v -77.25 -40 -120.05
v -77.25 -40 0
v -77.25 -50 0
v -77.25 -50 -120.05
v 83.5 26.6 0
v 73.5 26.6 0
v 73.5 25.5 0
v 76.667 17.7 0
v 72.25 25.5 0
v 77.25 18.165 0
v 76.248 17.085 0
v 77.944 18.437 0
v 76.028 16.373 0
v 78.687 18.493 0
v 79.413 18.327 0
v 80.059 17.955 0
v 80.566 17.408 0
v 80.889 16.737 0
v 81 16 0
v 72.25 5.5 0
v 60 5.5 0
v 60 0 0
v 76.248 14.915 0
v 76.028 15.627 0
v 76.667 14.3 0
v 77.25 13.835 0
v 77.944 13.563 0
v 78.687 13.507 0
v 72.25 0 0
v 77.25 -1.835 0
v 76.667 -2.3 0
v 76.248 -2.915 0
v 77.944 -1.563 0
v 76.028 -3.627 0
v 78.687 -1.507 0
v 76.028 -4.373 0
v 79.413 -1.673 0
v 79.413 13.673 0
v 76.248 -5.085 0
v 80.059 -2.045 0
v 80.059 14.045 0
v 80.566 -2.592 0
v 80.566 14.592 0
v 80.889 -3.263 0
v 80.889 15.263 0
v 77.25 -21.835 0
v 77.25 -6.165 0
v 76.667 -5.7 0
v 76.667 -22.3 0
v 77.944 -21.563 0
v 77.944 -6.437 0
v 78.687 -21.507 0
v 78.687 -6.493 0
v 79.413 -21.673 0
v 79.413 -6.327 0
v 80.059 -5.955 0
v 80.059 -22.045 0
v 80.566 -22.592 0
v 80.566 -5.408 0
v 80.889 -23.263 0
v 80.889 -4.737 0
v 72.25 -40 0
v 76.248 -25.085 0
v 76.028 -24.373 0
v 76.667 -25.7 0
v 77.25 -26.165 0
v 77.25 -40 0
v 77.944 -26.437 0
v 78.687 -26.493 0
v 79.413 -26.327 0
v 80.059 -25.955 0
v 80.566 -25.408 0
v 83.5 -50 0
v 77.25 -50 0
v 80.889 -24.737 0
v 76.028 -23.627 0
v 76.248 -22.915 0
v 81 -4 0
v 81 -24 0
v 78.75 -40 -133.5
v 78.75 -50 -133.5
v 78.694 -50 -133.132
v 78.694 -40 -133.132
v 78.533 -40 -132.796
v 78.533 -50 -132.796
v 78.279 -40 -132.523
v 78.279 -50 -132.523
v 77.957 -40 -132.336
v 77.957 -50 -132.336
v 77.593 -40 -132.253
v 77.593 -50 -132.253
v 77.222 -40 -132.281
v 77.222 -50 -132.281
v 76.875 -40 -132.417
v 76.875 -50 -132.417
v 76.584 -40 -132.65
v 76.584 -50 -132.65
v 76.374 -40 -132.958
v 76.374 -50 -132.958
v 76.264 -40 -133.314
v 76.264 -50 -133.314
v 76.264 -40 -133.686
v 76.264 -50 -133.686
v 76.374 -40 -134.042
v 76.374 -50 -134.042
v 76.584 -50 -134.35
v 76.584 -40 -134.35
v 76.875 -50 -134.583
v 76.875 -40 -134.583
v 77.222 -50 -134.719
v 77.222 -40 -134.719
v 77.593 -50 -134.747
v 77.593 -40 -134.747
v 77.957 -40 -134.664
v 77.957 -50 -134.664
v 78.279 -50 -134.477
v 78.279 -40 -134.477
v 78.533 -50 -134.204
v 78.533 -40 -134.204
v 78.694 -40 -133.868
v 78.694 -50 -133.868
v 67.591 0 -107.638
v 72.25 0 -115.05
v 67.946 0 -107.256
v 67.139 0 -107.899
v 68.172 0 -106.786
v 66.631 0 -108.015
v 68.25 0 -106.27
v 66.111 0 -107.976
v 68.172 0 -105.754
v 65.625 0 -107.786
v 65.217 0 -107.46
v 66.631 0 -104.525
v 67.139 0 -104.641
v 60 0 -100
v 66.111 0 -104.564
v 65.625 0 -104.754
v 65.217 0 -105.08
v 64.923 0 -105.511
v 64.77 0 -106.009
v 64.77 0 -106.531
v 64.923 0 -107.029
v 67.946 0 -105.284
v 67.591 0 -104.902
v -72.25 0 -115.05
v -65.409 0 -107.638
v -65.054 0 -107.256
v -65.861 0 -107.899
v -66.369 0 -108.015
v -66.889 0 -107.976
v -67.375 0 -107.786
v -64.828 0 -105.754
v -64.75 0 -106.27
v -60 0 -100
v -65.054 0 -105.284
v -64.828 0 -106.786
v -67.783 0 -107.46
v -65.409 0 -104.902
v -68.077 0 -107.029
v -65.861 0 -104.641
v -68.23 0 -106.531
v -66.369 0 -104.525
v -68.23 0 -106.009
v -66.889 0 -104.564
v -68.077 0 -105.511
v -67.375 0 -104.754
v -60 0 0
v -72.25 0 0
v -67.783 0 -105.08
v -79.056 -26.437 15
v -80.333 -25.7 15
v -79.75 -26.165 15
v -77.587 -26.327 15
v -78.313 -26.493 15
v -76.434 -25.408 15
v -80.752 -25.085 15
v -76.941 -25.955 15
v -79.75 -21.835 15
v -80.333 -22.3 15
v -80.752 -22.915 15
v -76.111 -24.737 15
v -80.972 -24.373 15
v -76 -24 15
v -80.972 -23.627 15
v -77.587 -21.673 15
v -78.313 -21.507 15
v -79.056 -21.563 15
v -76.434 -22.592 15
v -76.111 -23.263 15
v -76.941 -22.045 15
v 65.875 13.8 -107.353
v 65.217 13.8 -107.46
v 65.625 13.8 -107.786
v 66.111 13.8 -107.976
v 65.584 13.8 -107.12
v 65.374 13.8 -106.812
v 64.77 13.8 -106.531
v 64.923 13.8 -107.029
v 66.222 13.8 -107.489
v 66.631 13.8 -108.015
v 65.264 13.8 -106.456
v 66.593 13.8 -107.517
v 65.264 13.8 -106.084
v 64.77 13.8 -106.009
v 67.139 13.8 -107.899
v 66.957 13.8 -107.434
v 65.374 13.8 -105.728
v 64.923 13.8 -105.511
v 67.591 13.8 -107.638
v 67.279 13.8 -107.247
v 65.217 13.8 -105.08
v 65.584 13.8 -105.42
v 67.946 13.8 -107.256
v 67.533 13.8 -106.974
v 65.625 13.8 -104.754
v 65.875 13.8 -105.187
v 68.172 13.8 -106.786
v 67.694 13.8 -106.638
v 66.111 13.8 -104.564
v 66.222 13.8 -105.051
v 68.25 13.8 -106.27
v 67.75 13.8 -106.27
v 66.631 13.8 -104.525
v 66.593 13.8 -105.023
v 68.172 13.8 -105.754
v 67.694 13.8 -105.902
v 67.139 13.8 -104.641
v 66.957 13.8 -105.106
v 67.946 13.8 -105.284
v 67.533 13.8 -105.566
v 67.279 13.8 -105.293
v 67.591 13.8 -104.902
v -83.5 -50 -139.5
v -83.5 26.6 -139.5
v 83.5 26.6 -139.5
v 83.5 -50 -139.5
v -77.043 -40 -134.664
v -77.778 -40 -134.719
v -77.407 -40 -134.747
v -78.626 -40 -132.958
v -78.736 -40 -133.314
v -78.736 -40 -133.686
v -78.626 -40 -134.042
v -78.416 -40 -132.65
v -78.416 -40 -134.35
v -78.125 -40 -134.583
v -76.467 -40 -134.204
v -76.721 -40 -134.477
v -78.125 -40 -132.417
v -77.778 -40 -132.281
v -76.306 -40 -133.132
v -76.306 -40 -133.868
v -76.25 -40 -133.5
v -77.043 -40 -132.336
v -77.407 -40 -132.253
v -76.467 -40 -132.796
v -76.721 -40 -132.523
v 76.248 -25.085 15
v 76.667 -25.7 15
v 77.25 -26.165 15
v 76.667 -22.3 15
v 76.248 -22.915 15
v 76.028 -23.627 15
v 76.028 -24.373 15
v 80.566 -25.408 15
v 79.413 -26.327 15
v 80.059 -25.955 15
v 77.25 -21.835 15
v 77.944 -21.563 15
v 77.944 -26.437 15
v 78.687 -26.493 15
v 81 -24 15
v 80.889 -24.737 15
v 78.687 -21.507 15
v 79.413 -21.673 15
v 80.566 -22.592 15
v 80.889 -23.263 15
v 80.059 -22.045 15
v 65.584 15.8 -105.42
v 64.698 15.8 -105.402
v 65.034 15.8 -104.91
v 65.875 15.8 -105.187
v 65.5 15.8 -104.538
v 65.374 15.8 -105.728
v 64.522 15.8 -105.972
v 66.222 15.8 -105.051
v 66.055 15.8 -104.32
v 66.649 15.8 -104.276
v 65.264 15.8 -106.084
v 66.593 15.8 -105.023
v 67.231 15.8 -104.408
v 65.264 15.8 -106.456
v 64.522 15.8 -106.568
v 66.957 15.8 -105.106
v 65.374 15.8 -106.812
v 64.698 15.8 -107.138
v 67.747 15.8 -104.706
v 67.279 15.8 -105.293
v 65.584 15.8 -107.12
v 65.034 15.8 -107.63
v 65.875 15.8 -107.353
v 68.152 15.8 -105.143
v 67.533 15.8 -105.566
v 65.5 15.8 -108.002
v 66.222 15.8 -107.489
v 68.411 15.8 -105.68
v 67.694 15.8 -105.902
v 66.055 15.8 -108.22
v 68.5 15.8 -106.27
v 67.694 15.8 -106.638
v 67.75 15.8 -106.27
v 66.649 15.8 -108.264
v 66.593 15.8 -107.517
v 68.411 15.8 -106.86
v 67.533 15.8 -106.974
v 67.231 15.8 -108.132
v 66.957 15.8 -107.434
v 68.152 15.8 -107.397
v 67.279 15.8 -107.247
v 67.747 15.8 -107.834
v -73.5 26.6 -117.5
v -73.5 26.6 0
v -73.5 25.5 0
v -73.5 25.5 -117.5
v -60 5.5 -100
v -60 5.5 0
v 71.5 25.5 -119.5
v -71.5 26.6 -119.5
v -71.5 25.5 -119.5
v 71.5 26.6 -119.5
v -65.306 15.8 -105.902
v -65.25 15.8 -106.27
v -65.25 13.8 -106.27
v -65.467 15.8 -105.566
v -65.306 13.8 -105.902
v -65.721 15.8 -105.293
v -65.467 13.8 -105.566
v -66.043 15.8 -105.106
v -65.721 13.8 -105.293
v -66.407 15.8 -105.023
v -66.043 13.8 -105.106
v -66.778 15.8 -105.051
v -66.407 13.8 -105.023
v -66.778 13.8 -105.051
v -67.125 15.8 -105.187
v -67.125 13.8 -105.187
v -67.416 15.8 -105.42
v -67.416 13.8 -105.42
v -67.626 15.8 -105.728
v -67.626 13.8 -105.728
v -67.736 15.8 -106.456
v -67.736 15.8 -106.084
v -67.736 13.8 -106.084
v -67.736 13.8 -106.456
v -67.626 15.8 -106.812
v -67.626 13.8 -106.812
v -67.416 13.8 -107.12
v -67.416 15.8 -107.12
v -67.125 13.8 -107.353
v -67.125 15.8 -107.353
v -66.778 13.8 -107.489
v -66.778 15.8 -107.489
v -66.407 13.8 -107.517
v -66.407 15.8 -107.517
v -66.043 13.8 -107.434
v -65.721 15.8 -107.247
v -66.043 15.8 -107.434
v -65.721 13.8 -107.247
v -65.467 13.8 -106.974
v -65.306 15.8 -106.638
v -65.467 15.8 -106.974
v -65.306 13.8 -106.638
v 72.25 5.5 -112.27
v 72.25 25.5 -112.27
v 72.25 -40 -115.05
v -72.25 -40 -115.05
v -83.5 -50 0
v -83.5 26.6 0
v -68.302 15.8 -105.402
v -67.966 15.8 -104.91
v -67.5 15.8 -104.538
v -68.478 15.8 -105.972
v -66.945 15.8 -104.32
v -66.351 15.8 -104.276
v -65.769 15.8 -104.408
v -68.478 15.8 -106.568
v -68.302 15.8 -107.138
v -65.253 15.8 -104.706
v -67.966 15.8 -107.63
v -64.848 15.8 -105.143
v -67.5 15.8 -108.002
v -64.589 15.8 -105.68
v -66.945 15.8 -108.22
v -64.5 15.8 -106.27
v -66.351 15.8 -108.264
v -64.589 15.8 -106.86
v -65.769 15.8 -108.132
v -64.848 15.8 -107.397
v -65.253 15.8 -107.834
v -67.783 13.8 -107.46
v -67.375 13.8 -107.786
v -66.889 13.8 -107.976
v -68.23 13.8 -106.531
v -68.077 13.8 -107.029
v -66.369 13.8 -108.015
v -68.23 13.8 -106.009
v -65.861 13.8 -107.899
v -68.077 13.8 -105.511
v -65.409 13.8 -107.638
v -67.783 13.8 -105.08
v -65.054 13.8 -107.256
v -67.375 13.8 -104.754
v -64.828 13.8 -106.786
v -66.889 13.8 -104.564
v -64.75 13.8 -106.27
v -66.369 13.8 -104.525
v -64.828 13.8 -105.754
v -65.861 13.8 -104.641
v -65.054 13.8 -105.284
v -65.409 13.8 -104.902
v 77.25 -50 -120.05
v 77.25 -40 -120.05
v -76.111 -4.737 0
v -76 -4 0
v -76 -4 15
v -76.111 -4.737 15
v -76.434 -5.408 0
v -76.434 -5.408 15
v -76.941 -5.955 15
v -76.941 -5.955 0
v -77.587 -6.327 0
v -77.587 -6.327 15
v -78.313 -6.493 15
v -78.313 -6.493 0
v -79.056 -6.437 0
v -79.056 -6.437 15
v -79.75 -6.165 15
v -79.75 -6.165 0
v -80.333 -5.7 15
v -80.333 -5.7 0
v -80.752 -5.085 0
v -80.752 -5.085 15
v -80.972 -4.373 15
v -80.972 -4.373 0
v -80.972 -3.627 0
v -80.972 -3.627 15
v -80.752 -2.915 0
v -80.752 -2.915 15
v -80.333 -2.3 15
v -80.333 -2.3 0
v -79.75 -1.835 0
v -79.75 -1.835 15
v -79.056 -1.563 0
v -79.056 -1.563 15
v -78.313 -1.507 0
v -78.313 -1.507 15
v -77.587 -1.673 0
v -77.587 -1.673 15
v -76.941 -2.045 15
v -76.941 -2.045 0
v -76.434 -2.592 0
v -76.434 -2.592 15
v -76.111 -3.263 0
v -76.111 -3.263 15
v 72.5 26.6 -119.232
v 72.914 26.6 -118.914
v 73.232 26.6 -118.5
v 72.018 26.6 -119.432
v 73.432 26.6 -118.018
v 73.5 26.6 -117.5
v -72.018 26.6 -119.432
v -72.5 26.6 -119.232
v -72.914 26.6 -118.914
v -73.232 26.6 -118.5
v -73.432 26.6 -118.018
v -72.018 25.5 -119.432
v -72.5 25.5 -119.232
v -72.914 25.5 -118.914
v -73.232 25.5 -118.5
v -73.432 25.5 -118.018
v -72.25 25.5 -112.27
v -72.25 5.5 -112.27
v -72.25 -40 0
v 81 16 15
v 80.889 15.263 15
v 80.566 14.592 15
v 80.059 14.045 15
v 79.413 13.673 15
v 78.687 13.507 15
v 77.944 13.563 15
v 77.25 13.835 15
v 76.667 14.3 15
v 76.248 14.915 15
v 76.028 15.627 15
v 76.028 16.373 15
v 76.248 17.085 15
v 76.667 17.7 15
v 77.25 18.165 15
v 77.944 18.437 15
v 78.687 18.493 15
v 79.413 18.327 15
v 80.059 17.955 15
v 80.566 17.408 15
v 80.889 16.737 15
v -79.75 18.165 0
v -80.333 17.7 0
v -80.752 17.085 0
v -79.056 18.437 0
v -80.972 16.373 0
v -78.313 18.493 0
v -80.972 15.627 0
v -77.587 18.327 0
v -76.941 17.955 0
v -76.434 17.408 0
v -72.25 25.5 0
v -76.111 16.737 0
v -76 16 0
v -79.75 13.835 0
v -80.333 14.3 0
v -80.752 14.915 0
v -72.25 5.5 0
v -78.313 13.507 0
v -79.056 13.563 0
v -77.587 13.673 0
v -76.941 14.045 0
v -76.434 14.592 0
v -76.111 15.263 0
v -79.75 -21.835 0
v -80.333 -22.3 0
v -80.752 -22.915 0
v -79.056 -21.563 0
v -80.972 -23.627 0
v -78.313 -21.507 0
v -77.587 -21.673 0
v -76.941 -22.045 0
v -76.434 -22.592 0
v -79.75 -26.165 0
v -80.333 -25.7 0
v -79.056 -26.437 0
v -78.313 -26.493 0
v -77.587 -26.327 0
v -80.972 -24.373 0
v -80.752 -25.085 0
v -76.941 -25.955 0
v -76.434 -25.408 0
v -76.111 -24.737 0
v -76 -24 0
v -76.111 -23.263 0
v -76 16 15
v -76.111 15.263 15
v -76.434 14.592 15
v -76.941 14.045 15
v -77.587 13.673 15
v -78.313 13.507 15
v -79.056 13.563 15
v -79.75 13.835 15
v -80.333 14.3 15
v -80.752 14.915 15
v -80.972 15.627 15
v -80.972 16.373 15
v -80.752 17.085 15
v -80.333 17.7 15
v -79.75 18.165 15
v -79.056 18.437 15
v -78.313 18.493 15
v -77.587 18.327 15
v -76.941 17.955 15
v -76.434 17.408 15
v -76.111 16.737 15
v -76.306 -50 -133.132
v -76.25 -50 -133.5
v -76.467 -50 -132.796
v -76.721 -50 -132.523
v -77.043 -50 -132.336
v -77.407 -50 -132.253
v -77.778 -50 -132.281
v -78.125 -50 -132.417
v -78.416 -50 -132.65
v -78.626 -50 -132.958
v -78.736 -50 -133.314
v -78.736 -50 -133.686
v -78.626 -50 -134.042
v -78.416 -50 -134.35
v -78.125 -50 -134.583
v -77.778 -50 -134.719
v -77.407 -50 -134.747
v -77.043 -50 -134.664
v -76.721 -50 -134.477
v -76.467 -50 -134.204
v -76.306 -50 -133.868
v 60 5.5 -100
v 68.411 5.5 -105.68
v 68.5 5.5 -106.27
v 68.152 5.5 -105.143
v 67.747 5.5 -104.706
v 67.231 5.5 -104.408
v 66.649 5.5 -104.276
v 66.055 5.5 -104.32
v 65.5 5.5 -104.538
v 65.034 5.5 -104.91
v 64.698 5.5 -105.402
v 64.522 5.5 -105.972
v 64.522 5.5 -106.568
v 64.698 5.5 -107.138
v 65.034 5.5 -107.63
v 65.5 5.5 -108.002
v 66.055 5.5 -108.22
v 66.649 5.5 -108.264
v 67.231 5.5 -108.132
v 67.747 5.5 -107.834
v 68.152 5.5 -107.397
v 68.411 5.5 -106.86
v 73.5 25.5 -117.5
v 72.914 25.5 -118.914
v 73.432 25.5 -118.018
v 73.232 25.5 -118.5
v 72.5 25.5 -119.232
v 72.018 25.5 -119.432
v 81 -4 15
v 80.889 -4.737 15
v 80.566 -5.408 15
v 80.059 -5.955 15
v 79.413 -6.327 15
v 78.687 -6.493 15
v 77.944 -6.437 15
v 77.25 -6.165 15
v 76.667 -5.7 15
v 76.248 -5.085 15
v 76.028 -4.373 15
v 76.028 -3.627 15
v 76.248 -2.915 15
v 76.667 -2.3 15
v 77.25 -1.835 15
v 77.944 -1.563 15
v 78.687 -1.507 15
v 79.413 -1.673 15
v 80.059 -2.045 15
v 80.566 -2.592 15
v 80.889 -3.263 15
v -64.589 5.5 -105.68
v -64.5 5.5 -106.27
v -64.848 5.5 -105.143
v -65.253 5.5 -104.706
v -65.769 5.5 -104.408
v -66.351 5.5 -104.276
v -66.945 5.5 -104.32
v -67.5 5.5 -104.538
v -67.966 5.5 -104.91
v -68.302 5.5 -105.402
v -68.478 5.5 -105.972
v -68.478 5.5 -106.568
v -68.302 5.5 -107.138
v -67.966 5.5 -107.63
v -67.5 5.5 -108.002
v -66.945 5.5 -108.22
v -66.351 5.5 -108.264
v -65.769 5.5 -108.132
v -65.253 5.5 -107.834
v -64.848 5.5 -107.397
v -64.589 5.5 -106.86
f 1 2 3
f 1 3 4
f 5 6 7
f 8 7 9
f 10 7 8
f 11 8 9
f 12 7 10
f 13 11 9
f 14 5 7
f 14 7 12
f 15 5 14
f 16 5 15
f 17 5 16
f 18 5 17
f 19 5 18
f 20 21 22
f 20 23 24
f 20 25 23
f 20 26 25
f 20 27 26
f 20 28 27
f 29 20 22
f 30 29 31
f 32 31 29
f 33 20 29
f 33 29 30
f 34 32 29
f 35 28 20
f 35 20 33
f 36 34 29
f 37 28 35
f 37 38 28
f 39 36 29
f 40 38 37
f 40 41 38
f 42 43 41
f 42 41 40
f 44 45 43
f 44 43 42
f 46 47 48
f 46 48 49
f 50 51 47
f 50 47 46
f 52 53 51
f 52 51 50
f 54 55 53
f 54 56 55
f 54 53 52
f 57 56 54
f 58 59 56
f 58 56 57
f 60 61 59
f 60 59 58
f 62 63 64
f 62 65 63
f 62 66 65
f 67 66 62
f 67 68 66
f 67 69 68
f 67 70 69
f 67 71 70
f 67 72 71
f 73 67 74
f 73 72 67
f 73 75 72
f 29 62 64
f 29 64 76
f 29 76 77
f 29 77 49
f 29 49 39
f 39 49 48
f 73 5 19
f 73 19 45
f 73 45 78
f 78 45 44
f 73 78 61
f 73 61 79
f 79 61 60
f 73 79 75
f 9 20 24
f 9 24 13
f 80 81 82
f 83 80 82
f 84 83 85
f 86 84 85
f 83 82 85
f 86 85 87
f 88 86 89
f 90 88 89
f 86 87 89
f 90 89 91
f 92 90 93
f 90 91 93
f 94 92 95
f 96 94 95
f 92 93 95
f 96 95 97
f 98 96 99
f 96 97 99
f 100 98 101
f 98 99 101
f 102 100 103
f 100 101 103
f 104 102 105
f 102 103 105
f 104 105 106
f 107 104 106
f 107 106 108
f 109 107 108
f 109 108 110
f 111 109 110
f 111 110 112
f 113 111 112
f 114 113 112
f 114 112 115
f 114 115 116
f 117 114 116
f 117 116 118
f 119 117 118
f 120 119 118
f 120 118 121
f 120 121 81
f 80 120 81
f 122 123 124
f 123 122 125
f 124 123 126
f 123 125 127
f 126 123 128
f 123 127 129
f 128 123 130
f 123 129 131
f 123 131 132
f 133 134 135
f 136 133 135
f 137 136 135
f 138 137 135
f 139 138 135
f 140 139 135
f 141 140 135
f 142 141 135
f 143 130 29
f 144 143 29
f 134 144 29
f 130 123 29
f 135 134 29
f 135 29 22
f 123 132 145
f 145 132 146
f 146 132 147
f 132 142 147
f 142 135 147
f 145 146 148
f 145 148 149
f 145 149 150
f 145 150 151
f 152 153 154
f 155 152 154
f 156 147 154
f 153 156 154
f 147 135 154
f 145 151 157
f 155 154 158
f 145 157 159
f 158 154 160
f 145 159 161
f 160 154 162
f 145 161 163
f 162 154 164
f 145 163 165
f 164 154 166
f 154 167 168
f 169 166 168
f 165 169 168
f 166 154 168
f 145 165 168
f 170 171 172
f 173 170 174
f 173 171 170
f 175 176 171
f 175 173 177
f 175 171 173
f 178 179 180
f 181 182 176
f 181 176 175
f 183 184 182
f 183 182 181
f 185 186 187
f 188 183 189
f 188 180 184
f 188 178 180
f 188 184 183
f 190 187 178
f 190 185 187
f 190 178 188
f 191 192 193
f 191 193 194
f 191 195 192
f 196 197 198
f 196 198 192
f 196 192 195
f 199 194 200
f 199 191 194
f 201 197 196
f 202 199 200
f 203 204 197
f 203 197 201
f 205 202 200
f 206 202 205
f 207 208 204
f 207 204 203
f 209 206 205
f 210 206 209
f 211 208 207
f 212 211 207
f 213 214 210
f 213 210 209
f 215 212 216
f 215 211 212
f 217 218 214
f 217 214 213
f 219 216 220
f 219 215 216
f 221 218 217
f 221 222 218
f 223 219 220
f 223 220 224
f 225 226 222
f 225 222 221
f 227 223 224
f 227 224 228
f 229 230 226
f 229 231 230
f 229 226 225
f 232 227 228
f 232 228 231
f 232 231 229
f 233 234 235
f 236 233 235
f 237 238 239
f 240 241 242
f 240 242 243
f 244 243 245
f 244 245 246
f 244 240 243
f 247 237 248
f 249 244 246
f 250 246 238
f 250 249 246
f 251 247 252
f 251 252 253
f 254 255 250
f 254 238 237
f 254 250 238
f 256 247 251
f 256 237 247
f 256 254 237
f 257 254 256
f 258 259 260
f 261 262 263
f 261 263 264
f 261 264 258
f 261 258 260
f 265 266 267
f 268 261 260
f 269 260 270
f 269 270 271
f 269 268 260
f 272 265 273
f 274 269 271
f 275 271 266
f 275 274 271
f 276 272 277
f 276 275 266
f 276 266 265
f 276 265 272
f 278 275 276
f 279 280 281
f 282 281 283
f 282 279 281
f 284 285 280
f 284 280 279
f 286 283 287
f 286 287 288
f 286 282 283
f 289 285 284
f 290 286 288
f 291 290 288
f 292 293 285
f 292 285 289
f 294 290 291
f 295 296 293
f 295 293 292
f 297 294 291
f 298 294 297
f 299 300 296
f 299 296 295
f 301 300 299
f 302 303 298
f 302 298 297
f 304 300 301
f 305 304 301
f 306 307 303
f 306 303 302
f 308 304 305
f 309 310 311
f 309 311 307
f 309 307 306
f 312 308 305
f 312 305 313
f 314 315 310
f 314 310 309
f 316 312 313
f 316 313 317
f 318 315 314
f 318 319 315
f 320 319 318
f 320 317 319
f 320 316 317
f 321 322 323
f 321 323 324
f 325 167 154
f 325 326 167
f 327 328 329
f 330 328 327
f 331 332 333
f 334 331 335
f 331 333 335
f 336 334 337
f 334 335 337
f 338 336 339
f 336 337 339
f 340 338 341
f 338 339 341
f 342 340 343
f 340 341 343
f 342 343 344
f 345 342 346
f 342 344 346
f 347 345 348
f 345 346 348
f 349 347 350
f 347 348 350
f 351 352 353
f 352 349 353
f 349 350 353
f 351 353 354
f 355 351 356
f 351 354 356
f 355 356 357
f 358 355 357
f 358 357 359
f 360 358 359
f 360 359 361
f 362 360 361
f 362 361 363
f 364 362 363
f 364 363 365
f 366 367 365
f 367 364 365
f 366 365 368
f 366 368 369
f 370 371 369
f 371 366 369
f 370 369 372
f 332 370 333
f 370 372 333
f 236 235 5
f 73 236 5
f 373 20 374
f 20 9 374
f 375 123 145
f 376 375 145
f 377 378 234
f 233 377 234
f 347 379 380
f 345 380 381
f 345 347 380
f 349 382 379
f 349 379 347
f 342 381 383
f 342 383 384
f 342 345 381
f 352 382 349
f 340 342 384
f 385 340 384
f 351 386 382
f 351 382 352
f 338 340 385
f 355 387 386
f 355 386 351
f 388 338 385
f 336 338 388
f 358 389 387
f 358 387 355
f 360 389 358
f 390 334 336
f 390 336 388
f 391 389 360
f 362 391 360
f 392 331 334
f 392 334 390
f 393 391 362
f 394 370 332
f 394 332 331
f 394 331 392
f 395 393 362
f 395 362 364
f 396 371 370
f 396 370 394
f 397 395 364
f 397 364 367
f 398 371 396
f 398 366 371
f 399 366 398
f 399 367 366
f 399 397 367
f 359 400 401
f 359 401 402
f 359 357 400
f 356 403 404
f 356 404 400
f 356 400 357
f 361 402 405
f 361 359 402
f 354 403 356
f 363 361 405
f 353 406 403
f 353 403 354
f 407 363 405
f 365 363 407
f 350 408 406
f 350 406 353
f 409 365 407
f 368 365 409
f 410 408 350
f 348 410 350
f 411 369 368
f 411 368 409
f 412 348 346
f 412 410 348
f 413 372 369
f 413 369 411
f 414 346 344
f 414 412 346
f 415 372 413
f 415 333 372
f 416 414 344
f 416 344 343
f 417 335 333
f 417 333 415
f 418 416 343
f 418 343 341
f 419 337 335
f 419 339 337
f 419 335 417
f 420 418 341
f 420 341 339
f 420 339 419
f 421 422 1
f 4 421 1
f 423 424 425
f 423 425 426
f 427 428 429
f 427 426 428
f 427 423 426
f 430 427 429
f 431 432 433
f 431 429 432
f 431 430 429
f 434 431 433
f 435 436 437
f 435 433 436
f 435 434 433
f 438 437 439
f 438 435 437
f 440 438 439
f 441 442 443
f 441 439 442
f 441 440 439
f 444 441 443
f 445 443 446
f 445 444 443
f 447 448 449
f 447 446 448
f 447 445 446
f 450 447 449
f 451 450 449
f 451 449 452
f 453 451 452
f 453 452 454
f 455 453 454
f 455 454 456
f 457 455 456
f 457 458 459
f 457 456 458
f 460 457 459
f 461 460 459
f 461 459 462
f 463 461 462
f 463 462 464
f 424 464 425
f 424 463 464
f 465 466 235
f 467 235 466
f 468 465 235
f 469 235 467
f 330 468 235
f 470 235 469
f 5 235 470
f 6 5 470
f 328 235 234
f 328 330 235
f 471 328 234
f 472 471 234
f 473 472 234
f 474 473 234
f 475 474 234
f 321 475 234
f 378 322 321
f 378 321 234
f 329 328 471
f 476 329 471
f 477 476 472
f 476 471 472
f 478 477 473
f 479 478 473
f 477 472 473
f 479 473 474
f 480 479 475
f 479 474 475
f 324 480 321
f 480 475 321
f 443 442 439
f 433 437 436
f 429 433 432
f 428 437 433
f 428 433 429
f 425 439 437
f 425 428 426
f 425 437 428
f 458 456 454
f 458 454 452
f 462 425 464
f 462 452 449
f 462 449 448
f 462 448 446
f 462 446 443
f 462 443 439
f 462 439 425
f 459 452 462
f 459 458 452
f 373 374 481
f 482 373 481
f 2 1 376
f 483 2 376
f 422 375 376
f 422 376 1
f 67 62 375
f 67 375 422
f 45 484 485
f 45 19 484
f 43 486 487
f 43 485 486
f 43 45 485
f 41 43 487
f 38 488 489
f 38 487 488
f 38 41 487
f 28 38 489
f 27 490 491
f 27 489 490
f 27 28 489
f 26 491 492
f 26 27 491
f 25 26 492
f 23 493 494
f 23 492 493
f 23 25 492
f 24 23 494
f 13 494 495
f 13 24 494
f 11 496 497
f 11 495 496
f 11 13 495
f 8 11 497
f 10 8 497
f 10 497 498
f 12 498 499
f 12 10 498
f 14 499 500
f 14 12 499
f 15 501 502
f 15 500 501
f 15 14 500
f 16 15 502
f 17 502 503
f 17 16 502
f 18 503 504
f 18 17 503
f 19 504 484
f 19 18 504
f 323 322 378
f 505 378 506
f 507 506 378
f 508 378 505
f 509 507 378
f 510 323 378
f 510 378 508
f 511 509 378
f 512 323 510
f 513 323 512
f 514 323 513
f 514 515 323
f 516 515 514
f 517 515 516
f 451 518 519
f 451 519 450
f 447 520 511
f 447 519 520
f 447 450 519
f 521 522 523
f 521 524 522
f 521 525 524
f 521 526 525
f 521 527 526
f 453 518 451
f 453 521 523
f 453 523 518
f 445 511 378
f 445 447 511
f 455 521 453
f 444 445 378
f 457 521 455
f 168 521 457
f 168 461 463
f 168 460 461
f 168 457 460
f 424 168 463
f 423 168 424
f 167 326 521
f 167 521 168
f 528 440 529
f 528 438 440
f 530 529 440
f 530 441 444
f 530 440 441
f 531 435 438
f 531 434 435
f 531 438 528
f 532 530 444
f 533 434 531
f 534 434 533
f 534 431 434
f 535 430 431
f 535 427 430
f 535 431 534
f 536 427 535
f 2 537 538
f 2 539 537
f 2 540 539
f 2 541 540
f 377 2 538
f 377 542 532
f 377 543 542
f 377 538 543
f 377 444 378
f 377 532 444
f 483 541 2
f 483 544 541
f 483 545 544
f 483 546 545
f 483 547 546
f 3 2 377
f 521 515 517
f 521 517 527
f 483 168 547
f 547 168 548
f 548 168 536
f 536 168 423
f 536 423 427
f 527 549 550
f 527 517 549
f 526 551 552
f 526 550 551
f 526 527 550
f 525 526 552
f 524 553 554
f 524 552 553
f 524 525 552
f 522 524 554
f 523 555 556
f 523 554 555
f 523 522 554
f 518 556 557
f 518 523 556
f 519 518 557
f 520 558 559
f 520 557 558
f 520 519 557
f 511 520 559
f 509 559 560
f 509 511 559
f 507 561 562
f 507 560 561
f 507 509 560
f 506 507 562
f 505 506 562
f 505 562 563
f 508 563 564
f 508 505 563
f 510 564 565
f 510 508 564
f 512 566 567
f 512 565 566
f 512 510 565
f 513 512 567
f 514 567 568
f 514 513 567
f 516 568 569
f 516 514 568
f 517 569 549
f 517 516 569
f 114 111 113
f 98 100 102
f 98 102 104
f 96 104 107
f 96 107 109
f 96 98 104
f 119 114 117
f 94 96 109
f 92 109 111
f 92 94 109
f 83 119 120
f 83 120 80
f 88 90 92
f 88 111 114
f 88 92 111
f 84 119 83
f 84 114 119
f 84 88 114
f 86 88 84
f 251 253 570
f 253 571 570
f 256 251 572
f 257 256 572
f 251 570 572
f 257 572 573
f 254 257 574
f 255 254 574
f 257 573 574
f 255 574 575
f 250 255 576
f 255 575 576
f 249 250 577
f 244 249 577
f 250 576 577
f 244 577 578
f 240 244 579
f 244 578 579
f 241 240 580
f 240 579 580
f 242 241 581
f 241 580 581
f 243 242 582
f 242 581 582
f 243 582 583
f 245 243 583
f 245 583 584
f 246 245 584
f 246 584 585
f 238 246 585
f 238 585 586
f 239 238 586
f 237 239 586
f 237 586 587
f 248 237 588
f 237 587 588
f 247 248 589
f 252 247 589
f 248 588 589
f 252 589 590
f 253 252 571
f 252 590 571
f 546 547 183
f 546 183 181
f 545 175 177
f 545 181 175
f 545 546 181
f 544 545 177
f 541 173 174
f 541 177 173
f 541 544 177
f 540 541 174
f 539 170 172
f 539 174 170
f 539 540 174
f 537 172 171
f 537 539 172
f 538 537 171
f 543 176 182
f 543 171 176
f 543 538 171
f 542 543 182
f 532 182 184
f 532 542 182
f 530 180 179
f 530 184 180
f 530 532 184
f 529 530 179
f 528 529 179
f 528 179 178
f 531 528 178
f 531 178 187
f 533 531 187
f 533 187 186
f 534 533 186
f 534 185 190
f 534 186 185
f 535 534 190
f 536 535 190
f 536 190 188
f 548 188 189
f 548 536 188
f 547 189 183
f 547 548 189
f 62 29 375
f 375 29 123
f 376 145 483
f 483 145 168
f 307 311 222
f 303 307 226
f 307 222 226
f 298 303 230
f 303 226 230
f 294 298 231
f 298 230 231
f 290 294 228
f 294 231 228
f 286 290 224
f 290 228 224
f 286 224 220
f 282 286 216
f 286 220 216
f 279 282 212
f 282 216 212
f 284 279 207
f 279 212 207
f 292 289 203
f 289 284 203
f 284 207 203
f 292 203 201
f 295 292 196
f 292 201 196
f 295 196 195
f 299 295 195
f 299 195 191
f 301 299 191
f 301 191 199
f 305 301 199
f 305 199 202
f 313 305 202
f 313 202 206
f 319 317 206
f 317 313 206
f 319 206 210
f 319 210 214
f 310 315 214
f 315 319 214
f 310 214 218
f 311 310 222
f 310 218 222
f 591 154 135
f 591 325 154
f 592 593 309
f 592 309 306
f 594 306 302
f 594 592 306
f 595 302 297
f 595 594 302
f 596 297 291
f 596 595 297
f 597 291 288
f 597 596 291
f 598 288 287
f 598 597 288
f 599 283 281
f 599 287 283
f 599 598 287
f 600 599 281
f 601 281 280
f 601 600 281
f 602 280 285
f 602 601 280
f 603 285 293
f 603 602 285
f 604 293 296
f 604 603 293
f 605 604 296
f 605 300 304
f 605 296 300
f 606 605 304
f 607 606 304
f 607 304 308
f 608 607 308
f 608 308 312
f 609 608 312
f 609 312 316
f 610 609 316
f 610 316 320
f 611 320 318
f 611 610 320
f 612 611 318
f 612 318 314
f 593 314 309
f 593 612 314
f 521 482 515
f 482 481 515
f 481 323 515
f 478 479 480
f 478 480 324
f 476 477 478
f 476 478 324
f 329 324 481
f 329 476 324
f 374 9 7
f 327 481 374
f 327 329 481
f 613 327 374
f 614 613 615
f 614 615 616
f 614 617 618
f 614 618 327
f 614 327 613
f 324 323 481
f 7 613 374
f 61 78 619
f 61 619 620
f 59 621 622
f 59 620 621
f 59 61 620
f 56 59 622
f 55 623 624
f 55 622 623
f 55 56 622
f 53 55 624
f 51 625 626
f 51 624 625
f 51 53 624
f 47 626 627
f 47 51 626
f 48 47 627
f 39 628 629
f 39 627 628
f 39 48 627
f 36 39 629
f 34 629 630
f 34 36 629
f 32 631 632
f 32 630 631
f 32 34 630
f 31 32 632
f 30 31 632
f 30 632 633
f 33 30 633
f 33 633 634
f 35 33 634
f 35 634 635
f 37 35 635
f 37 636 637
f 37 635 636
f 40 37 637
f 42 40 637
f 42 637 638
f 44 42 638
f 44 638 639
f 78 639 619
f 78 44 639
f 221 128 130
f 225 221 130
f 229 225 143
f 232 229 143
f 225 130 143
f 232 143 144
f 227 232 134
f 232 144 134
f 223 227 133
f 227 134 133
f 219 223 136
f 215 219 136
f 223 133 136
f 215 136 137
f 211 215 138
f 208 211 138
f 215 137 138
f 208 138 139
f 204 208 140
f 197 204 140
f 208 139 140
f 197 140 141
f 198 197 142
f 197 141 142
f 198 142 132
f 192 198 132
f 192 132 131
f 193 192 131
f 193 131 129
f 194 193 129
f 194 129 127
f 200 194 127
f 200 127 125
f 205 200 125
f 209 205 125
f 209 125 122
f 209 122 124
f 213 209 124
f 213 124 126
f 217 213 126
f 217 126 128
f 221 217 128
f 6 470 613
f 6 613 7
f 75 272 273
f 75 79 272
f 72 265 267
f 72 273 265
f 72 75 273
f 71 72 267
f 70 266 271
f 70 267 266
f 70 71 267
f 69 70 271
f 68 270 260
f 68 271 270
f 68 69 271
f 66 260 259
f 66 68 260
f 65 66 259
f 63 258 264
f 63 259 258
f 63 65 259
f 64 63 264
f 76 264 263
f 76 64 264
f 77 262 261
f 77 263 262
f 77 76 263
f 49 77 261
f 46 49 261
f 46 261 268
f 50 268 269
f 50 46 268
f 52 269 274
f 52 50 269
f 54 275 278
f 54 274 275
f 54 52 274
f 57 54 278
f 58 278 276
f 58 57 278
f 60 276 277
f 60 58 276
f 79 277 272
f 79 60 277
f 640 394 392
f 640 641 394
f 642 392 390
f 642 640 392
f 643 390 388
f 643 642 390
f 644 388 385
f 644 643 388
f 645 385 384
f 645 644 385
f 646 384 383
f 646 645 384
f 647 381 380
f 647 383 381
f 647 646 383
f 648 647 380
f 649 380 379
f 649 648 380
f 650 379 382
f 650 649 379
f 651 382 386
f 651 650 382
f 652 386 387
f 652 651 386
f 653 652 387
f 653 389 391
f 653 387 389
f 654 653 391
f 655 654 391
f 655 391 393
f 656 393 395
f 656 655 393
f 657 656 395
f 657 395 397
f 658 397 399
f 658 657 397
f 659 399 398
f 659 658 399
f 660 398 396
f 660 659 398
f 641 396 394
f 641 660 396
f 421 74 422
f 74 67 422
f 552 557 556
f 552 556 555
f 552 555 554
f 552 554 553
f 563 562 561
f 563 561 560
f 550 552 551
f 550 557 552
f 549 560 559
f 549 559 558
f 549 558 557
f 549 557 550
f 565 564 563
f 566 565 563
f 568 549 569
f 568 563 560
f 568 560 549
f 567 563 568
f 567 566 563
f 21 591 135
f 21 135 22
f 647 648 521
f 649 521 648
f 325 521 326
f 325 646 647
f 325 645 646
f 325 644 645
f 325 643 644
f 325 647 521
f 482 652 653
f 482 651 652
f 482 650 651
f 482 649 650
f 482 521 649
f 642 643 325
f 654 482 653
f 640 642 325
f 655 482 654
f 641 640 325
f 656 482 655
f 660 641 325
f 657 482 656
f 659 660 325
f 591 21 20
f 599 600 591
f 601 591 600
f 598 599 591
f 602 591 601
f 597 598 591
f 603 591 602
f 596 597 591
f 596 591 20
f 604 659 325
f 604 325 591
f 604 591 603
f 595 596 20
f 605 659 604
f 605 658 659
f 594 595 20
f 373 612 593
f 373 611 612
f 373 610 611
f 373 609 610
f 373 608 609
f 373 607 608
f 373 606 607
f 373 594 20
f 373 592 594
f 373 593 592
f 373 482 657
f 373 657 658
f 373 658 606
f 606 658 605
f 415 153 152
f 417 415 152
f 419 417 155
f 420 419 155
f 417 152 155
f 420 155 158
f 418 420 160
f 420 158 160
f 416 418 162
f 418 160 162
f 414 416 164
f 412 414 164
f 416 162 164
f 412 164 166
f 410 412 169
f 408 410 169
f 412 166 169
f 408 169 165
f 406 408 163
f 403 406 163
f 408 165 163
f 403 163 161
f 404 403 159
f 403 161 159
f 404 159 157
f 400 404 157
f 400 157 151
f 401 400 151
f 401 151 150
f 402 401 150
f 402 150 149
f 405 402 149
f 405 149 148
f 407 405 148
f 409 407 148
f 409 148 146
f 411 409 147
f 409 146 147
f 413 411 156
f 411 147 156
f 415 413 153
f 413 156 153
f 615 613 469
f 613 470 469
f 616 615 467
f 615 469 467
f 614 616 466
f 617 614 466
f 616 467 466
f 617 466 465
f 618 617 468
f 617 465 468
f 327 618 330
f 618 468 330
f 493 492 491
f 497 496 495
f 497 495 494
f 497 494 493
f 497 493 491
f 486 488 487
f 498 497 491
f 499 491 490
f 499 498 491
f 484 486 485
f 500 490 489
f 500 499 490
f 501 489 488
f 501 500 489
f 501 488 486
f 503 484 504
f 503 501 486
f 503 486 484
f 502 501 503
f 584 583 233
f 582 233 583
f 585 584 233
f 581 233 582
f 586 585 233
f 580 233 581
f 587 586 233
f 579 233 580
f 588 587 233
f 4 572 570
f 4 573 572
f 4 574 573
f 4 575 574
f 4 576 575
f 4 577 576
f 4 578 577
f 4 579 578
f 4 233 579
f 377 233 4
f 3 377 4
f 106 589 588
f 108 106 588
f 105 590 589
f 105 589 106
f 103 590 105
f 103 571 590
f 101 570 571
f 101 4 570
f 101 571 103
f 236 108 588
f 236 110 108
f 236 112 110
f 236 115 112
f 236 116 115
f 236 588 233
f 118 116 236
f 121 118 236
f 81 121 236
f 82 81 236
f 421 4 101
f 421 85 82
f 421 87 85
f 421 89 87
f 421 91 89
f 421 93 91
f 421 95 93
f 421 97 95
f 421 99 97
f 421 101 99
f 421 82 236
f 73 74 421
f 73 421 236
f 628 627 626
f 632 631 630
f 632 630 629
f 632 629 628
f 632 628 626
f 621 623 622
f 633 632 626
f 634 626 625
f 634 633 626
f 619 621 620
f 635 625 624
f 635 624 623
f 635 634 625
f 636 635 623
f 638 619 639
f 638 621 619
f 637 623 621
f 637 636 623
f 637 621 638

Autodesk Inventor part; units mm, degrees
ref_plane "YZ Plane" through (0, 0, 0) normal (1, 0, 0) x (0, 1, 0)
ref_plane "XZ Plane" through (0, 0, 0) normal (0, 1, 0) x (-1, 0, 0)
ref_plane "XY Plane" through (0, 0, 0) normal (0, 0, 1) x (1, 0, 0)
sketch "Sketch1" plane through (0, 0, 0) normal (0, 1, 0) x (-1, 0, 0)
  line L0 (-83.5, 139.5) -> (83.5, 139.5)
  line L1 (83.5, 139.5) -> (83.5, -139.5)
  line L2 (83.5, -139.5) -> (-83.5, -139.5)
  line L3 (-83.5, -139.5) -> (-83.5, 139.5)
  line L4 (-83.5, 139.5) -> (83.5, -139.5) construction
  line L5 (83.5, 139.5) -> (-83.5, -139.5) construction
  point P0 (0, 0)
  dimension "d0" = 167
  dimension "d1" = 279
extrude "Extrusion1" add sketch "Sketch1" along normal blind 26.6
sketch "Sketch2" plane through (0, 26.6, 0) normal (0, 1, 0) x (1, 0, 0)
  line L0 (71.5, -119.5) -> (-71.5, -119.5)
  line L1 (-73.5, -117.5) -> (-73.5, 117.5)
  line L2 (-71.5, 119.5) -> (71.5, 119.5)
  line L3 (73.5, 117.5) -> (73.5, -117.5)
  line L4 (73.5, -119.5) -> (-73.5, 119.5) construction
  line L5 (-73.5, -119.5) -> (73.5, 119.5) construction
  arc A0 (-73.5, -117.5) -> (-71.5, -119.5) centre (-71.5, -117.5) ccw
  arc A1 (-71.5, 119.5) -> (-73.5, 117.5) centre (-71.5, 117.5) ccw
  arc A2 (73.5, 117.5) -> (71.5, 119.5) centre (71.5, 117.5) ccw
  arc A3 (71.5, -119.5) -> (73.5, -117.5) centre (71.5, -117.5) ccw
  point P0 (0, 0)
  dimension "d4" = 147
  dimension "d5" = 239
  dimension "d6" = 2
extrude "Extrusion2" cut sketch "Sketch2" against normal blind 1.1
sketch "Sketch3" plane through (0, 25.5, 0) normal (0, 1, 0) x (1, 0, 0)
  line L0 (-73.5, -117.5) -> (-73.5, 117.5) projected
  line L1 (71.5, -119.5) -> (-71.5, -119.5) projected
  line L2 (-72.25, -117.83) -> (72.25, -117.83)
  line L3 (72.25, -117.83) -> (72.25, 112.27)
  line L4 (72.25, 112.27) -> (-72.25, 112.27)
  line L5 (-72.25, 112.27) -> (-72.25, -117.83)
  point P0 (0, 0)
  dimension "d9" = 1.25
  dimension "d10" = 1.67
  dimension "d11" = 144.5
  dimension "d12" = 230.1
extrude "Extrusion3" cut sketch "Sketch3" against normal blind 20
sketch "Sketch4" plane through (0, 5.5, 0) normal (0, 1, 0) x (1, 0, 0)
  circle A0 centre (-66.5, -111.83) radius 2
  line L0 (72.25, -117.83) -> (-72.25, -117.83) projected
  line L1 (-72.25, -117.83) -> (-72.25, 112.27) projected
  circle A1 centre (66.5, -111.83) radius 2
  line L2 (72.25, 112.27) -> (72.25, -117.83) projected
  circle A2 centre (-66.5, 106.27) radius 2
  line L3 (-72.25, 112.27) -> (72.25, 112.27) projected
  circle A3 centre (66.5, 106.27) radius 2
  point P0 (0, 0)
  dimension "d15" = 4
  dimension "d16" = 6
  dimension "d17" = 5.75
  dimension "d18" = 4
  dimension "d19" = 6
  dimension "d20" = 5.75
  dimension "d21" = 4
  dimension "d22" = 5.75
  dimension "d23" = 6
  dimension "d24" = 4
  dimension "d25" = 6
  dimension "d26" = 5.75
extrude "Extrusion4" add sketch "Sketch4" along normal blind 10.3 contours A0 | A1 | A2 | A3
sketch "Sketch5" plane through (0, 5.5, 0) normal (0, 1, 0) x (1, 0, 0)
  circle A0 centre (-66.5, -111.83) radius 2 projected
  circle A1 centre (-66.5, -111.83) radius 1.25
  circle A2 centre (-66.5, 106.27) radius 2 projected
  circle A3 centre (-66.5, 106.27) radius 1.25
  circle A4 centre (66.5, 106.27) radius 2 projected
  circle A5 centre (66.5, 106.27) radius 1.25
  circle A6 centre (66.5, -111.83) radius 1.25
  point P0 (0, 0)
  dimension "d29" = 2.5
  dimension "d30" = 2.5
  dimension "d31" = 2.5
  dimension "d32" = 2.5
extrude "Extrusion5" cut sketch "Sketch5" along normal blind 10.3 and the other way blind 5.5 contours A1 | A3 | A5 | A6
sketch "Sketch8" plane through (0, 0, 0) normal (0, -1, 0) x (1, 0, 0)
  circle A0 centre (66.5, 111.83) radius 1.25 projected
  circle A1 centre (66.5, 111.83) radius 1.75
  circle A2 centre (66.5, -106.27) radius 1.25 projected
  circle A3 centre (66.5, -106.27) radius 1.75
  circle A4 centre (-66.5, -106.27) radius 1.25 projected
  circle A5 centre (-66.5, -106.27) radius 1.75
  circle A6 centre (-66.5, 111.83) radius 1.75
  point P0 (0, 0)
  dimension "d49" = 3.5
  dimension "d50" = 3.5
  dimension "d51" = 3.5
  dimension "d52" = 3.5
extrude "Extrusion8" cut sketch "Sketch8" against normal blind 13.8
sketch "Sketch9" plane through (0, 5.5, 0) normal (0, 1, 0) x (1, 0, 0)
  line L0 (60, -100) -> (-60, -100)
  line L1 (-60, -100) -> (-60, 100)
  line L2 (-60, 100) -> (60, 100)
  line L3 (60, 100) -> (60, -100)
  line L4 (60, -100) -> (-60, 100) construction
  line L5 (-60, -100) -> (60, 100) construction
  point P0 (0, 0)
  dimension "d55" = 120
  dimension "d56" = 200
extrude "Extrusion9" cut sketch "Sketch9" against normal blind 5.8
sketch "Sketch10" plane through (0, 0, 0) normal (0, -1, 0) x (1, 0, 0)
  line L0 (83.5, 139.5) -> (83.5, -139.5) projected
  line L1 (-83.5, -139.5) -> (-83.5, 139.5) projected
  line L2 (83.5, 139.5) -> (-83.5, 139.5)
  line L3 (-83.5, 139.5) -> (-83.5, -139.5)
  line L4 (-83.5, -139.5) -> (83.5, -139.5)
  line L5 (83.5, -139.5) -> (83.5, 139.5)
  line L6 (72.25, -115.05) -> (-72.25, -115.05)
  line L7 (-72.25, -115.05) -> (-72.25, 115.05)
  line L8 (-72.25, 115.05) -> (72.25, 115.05)
  line L9 (72.25, 115.05) -> (72.25, -115.05)
  line L10 (72.25, -115.05) -> (-72.25, 115.05) construction
  line L11 (-72.25, -115.05) -> (72.25, 115.05) construction
  line L12 (-83.5, -139.5) -> (83.5, -139.5)
  line L13 (83.5, -139.5) -> (83.5, 139.5)
  line L14 (83.5, 139.5) -> (-83.5, 139.5)
  line L15 (-83.5, 139.5) -> (-83.5, -139.5)
  point P0 (0, 0)
  point P1 (71.5, 119.5)
  dimension "d67" = 144.5
  dimension "d68" = 230.1
extrude "Extrusion10" add sketch "Sketch10" along normal blind 40
sketch "Sketch12" plane through (0, -40, 0) normal (0, -1, 0) x (1, 0, 0)
  line L0 (-72.25, -115.05) -> (-72.25, 115.05) projected
  line L1 (72.25, -115.05) -> (-72.25, -115.05) projected
  line L2 (-77.25, -120.05) -> (-72.25, -120.05)
  line L3 (-72.25, -120.05) -> (-72.25, 120.05)
  line L4 (-72.25, 120.05) -> (-77.25, 120.05)
  line L5 (-77.25, 120.05) -> (-77.25, -120.05)
  line L6 (72.25, 115.05) -> (72.25, -115.05) projected
  line L7 (77.25, -120.05) -> (72.25, -120.05)
  line L8 (72.25, -120.05) -> (72.25, 120.05)
  line L9 (72.25, 120.05) -> (77.25, 120.05)
  line L10 (77.25, 120.05) -> (77.25, -120.05)
  line L11 (72.25, 115.05) -> (-72.25, 115.05) projected
  line L12 (72.25, 120.05) -> (-72.25, 120.05)
  line L13 (-72.25, 120.05) -> (-72.25, 115.05)
  line L14 (-72.25, 115.05) -> (72.25, 115.05)
  line L15 (72.25, 115.05) -> (72.25, 120.05)
  line L16 (-83.5, 139.5) -> (-83.5, -139.5) projected
  line L17 (83.5, 139.5) -> (-83.5, 139.5) projected
  line L18 (-83.5, -139.5) -> (83.5, -139.5)
  line L19 (83.5, -139.5) -> (83.5, 139.5)
  line L20 (83.5, 139.5) -> (-83.5, 139.5)
  line L21 (-83.5, 139.5) -> (-83.5, -139.5)
  line L22 (-72.25, -115.05) -> (72.25, -115.05) projected
  line L23 (-72.25, -115.05) -> (72.25, -115.05)
  line L24 (72.25, -115.05) -> (72.25, -120.05)
  line L25 (72.25, -120.05) -> (-72.25, -120.05)
  line L26 (-72.25, -120.05) -> (-72.25, -115.05)
  point P0 (0, 0)
  dimension "d69" = 5
  dimension "d70" = 5
  dimension "d71" = 240.1
  dimension "d72" = 5
  dimension "d73" = 5
  dimension "d74" = 240.1
extrude "Extrusion11" add sketch "Sketch12" along normal blind 10
sketch "Sketch13" plane through (0, -50, 0) normal (0, -1, 0) x (1, 0, 0)
  circle A0 centre (-77.5, -133.5) radius 1.25
  line L0 (-83.5, 139.5) -> (-83.5, -139.5) projected
  line L1 (-83.5, -139.5) -> (83.5, -139.5) projected
  circle A1 centre (-77.5, 133.5) radius 1.25
  line L2 (83.5, 139.5) -> (-83.5, 139.5) projected
  circle A2 centre (77.5, 133.5) radius 1.25
  line L3 (83.5, -139.5) -> (83.5, 139.5) projected
  circle A3 centre (77.5, -133.5) radius 1.25
  point P0 (0, 0)
  dimension "d77" = 2.5
  dimension "d78" = 6
  dimension "d79" = 6
  dimension "d80" = 2.5
  dimension "d81" = 6
  dimension "d82" = 6
  dimension "d83" = 2.5
  dimension "d84" = 6
  dimension "d85" = 6
  dimension "d86" = 6
  dimension "d87" = 6
extrude "Extrusion12" cut sketch "Sketch13" against normal blind 10 contours A0 | A1 | A2 | A3
sketch "Sketch14" plane through (83.5, 26.6, 139.5) normal (1, 0, 0) x (0, 0, -1)
  line L0 (0, 0) -> (279, 0) projected
  line L1 (139.5, 0) -> (139.5, -76.6)
  line L2 (259.55, -76.6) -> (19.45, -76.6) projected
  point P0 (139.5, -26.6)
split_face "Split1"
sketch "Sketch16" plane through (83.5, -50, 0) normal (1, 0, 0) x (0, 0, -1)
  line L0 (-139.5, 0) -> (-139.5, 76.6) projected
  line L1 (-139.5, 76.6) -> (0, 76.6)
  line L2 (0, 76.6) -> (0, 0)
  line L3 (0, 0) -> (-139.5, 0)
  line L4 (-139.5, 0) -> (-139.5, 76.6)
  point P0 (0, 50)
extrude "Extrusion13" cut sketch "Sketch16" against normal blind 167.1625
sketch "Sketch17" plane through (-72.25, 0, 0) normal (0, 0, 1) x (1, 0, 0)
  circle A0 centre (-6.25, 16) radius 2.5
  circle A1 centre (-6.25, -4) radius 2.5
  circle A2 centre (-6.25, -24) radius 2.5
  line L0 (155.75, 26.6) -> (145.75, 26.6) projected
  circle A3 centre (150.75, 16) radius 2.5
  circle A4 centre (150.75, -4) radius 2.5
  circle A5 centre (150.75, -24) radius 2.5
  point P0 (72.25, 0)
  dimension "d92" = 5
  dimension "d95" = 5
  dimension "d97" = 5
  dimension "d99" = 5
extrude "Extrusion14" add sketch "Sketch17" along normal blind 15
properties part number "Enclosure"
